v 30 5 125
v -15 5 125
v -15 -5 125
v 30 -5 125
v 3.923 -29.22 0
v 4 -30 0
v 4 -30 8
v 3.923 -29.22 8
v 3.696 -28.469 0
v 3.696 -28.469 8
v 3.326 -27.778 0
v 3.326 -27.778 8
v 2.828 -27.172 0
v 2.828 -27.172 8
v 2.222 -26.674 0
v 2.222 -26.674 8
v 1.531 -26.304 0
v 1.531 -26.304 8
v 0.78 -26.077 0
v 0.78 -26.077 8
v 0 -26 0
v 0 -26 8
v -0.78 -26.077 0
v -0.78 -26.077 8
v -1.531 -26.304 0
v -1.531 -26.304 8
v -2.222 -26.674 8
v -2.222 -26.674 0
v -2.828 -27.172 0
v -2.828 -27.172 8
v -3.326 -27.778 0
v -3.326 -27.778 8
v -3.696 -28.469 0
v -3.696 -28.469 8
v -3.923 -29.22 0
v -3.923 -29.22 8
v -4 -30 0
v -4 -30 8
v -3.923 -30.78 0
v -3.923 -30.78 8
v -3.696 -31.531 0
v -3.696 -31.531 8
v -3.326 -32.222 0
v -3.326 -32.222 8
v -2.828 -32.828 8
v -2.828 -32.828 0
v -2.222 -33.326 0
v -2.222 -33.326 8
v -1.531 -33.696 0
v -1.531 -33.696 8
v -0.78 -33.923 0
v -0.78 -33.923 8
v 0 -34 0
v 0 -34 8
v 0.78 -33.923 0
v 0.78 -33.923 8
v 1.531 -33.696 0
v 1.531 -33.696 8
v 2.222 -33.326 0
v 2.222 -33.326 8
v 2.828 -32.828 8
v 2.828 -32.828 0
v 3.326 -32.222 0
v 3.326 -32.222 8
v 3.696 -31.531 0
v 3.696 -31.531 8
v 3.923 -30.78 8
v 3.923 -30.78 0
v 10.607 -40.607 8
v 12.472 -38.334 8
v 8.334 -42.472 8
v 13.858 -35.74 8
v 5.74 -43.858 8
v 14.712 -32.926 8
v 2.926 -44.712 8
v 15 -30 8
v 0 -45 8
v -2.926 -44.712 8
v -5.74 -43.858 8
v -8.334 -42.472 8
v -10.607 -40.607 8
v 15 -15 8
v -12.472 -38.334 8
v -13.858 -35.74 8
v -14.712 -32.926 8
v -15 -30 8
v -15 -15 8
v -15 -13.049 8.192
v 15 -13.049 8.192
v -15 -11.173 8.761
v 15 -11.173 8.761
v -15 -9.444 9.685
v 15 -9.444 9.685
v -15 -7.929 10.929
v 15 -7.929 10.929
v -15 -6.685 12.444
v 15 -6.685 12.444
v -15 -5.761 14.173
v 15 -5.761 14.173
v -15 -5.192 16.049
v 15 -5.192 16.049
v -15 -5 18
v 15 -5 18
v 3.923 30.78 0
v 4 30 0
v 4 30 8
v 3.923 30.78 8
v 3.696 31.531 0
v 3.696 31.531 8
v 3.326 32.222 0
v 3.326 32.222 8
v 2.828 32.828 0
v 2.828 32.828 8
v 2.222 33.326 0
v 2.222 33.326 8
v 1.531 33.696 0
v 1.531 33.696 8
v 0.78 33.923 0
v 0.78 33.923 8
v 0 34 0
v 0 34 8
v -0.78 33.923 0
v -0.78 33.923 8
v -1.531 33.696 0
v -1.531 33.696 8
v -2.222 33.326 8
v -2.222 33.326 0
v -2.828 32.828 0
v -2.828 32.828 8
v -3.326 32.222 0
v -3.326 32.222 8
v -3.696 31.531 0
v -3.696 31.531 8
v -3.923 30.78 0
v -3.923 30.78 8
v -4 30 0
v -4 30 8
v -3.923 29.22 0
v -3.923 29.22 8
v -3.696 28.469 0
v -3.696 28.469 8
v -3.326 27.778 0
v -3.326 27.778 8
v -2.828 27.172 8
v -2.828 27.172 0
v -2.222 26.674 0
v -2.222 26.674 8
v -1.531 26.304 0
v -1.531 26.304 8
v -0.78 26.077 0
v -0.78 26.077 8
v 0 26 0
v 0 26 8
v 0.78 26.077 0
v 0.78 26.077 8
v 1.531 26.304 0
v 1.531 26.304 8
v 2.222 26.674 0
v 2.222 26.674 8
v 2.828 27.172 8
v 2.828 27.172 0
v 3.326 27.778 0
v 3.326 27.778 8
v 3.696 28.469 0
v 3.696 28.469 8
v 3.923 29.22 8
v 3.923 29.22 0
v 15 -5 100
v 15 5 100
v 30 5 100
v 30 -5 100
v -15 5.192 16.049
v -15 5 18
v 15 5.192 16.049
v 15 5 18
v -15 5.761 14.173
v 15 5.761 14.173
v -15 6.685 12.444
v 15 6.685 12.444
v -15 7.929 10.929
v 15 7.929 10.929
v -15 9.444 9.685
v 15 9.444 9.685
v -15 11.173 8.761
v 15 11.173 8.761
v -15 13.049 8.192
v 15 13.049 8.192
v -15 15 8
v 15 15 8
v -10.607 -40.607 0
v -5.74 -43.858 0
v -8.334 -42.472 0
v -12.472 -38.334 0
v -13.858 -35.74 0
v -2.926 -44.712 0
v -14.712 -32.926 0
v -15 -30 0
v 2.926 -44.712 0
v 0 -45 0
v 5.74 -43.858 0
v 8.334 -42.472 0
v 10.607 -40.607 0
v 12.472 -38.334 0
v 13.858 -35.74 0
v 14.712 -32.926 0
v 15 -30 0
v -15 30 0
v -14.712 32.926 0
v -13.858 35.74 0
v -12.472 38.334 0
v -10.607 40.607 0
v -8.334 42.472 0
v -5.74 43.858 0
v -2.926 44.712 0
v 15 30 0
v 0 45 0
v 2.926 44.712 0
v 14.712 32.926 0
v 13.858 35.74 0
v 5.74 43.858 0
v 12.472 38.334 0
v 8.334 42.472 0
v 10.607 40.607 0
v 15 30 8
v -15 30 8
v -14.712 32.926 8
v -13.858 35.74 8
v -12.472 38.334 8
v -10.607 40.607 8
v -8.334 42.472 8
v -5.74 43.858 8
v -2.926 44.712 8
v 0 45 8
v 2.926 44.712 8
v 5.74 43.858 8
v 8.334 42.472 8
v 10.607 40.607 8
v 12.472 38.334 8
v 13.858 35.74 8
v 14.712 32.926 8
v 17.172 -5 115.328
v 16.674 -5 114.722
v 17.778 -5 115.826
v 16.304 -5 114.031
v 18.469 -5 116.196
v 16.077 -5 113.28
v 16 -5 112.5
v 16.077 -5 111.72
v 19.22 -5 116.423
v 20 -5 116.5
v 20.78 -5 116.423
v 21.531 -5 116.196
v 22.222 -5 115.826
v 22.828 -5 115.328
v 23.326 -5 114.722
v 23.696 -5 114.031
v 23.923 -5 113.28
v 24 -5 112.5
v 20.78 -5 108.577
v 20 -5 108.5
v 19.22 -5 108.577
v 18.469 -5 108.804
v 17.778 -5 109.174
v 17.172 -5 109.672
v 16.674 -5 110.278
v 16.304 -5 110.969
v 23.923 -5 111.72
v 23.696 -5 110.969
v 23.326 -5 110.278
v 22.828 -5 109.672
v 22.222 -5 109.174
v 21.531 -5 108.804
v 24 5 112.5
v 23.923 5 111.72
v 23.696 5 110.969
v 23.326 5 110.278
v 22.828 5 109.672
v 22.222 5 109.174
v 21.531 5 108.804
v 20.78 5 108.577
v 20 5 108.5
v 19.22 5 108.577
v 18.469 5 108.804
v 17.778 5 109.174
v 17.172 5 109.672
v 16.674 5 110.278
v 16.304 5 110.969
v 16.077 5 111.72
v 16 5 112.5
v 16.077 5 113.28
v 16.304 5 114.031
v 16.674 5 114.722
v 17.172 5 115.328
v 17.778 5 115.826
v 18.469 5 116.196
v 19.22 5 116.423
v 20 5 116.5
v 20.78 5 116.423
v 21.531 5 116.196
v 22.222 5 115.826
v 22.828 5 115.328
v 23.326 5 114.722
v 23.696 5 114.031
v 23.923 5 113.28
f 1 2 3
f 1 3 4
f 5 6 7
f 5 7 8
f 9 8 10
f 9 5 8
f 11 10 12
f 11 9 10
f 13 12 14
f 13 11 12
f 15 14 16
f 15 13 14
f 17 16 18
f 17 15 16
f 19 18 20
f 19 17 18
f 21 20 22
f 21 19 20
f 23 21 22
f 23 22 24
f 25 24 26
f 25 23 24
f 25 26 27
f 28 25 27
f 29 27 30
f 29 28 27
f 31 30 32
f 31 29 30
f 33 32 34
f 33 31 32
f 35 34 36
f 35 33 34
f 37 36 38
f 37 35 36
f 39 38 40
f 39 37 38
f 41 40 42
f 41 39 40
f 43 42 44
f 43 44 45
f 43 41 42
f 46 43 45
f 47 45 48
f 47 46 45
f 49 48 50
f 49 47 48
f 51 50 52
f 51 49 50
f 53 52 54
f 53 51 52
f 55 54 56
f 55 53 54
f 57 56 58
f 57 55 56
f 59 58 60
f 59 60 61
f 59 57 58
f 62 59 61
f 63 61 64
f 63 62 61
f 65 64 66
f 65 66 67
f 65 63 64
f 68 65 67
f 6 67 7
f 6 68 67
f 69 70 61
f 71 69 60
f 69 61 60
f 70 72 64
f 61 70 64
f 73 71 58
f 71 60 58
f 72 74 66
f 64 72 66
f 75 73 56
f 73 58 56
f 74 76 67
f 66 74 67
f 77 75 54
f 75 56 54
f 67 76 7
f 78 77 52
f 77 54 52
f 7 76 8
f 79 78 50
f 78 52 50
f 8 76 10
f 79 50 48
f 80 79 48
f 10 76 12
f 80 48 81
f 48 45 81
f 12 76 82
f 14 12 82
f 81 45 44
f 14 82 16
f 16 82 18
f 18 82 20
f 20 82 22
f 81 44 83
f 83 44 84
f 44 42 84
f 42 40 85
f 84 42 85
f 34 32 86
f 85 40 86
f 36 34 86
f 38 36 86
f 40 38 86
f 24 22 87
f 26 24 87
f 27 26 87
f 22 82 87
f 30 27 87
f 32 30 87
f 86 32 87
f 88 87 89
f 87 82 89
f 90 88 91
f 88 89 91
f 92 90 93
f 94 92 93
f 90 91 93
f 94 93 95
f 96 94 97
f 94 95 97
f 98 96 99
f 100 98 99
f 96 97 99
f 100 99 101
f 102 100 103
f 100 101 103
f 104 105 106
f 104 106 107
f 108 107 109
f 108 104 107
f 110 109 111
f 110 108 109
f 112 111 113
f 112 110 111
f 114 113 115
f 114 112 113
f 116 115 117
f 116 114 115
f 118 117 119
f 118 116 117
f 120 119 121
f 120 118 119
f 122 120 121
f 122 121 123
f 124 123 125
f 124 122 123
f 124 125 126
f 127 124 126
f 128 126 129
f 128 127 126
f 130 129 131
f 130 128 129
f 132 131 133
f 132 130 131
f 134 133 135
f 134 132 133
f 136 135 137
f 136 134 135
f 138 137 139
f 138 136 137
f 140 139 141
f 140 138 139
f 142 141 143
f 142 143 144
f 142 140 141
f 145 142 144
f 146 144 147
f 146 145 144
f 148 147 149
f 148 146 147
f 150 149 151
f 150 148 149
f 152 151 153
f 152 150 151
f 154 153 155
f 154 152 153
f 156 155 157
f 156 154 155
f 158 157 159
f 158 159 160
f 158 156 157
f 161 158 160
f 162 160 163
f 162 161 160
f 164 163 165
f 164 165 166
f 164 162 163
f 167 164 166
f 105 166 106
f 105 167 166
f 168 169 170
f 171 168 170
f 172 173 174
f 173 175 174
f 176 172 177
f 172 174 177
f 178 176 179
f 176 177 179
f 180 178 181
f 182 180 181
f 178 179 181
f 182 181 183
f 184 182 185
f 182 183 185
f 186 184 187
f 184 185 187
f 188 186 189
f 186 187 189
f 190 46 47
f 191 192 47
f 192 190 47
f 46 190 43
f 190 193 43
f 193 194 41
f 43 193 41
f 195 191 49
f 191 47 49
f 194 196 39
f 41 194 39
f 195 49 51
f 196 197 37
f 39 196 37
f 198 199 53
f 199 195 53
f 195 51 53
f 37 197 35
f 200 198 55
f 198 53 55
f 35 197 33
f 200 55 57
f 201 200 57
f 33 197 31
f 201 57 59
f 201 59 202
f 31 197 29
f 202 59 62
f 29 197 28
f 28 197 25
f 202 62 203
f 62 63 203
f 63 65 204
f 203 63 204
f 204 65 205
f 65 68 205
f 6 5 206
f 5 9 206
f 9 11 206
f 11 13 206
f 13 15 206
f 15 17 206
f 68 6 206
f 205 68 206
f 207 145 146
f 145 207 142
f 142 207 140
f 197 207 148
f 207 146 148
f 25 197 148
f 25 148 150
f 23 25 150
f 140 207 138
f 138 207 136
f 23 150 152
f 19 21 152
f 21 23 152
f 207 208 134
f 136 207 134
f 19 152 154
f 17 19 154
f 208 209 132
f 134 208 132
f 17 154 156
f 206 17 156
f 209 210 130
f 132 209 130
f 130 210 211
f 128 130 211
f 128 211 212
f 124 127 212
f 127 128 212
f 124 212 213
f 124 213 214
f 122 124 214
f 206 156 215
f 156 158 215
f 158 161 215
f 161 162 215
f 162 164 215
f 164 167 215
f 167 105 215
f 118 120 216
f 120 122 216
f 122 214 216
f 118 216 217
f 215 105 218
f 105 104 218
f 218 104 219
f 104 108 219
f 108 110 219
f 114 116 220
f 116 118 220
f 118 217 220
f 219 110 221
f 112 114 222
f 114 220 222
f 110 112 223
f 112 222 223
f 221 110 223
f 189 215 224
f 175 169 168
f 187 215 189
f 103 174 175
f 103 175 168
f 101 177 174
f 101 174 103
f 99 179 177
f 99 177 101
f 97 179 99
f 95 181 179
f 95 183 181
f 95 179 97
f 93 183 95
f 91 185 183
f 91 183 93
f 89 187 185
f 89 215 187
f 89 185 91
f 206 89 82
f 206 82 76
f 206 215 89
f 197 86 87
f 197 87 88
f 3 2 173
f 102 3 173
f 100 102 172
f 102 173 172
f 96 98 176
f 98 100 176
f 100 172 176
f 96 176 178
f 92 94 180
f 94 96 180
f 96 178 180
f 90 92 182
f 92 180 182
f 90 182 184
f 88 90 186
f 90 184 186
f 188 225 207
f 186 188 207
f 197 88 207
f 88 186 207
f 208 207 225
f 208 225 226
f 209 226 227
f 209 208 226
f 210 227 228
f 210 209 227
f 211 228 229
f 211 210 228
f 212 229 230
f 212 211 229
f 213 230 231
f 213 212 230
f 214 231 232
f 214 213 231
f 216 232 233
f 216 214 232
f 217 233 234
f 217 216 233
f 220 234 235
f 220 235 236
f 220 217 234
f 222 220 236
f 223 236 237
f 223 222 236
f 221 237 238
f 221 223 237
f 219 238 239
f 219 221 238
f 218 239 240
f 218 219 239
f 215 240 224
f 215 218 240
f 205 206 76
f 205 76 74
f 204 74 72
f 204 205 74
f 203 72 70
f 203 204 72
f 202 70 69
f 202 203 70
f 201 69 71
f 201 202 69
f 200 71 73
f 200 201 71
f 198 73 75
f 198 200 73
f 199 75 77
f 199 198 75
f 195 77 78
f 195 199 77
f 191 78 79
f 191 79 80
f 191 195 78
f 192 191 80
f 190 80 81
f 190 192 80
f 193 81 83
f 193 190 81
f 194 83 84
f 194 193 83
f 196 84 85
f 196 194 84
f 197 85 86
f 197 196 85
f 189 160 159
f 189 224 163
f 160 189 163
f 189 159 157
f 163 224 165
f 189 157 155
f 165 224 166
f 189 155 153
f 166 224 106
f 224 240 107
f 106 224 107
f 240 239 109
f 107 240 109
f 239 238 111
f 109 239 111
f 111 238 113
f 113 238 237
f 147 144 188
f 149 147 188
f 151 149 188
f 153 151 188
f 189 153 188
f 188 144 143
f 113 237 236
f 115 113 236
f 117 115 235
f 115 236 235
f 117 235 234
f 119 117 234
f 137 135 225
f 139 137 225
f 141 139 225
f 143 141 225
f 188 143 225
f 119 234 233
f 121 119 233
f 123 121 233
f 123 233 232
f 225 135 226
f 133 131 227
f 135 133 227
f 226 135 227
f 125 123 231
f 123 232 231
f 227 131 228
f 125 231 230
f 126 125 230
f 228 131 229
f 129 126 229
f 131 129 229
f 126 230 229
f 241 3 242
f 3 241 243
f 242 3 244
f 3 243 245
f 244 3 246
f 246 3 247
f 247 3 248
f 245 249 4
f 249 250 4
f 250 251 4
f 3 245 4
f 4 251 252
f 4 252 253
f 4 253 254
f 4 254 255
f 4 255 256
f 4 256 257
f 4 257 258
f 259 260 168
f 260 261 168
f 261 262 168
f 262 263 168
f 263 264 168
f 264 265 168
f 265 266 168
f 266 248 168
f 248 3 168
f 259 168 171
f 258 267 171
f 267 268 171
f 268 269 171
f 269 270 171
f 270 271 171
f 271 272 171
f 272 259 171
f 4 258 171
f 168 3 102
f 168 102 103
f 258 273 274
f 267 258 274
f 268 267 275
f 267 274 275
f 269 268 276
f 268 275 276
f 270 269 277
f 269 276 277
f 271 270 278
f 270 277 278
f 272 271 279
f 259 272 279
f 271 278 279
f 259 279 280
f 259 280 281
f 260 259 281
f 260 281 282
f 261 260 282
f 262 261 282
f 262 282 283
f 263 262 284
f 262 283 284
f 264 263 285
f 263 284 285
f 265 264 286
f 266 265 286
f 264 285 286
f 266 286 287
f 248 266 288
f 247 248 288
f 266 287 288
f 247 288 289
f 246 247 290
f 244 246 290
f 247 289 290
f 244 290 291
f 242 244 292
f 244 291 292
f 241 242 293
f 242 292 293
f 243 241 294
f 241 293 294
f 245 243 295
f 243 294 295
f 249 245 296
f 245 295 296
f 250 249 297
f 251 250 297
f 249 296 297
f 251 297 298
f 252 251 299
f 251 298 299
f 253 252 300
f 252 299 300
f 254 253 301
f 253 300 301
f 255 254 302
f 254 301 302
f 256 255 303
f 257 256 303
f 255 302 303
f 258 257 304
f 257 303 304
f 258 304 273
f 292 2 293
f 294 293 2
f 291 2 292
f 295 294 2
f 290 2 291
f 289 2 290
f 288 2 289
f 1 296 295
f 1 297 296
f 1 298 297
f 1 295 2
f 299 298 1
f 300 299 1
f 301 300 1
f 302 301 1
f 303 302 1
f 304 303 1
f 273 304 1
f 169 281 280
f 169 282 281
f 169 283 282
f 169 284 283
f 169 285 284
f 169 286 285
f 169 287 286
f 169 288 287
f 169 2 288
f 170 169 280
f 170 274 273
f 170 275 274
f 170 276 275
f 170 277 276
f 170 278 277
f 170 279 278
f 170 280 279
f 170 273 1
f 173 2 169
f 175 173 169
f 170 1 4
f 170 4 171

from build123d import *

# Parameters (mm, degrees)
SKETCH1_R           = 4
BOSS_EXTRUDE1_DEPTH = 8
SKETCH2_W           = 30
SKETCH2_H           = 10
BOSS_EXTRUDE2_DEPTH = 100
FILLET1_R           = 10
SKETCH5_W           = 45
SKETCH5_H           = 25
SKETCH5_R           = 4
BOSS_EXTRUDE4_DEPTH = 10


with BuildPart() as part:
    # Sketch1 → Boss-Extrude1 (new body)
    with BuildSketch(Plane.XY):
        with BuildLine():
            Line((15, 30), (15, -30))
            ThreePointArc((15, -30), (0, -45), (-15, -30))
            Line((-15, -30), (-15, 30))
            ThreePointArc((-15, 30), (0, 45), (15, 30))
        make_face()
        with Locations((0, 30)):
            Circle(SKETCH1_R, mode=Mode.SUBTRACT)
        with Locations((0, -30)):
            Circle(SKETCH1_R, mode=Mode.SUBTRACT)
    extrude(amount=BOSS_EXTRUDE1_DEPTH)

    # Sketch2 → Boss-Extrude2 (add)
    with BuildSketch(Plane.XY):
        Rectangle(SKETCH2_W, SKETCH2_H)
    extrude(amount=BOSS_EXTRUDE2_DEPTH)

    # Fillet1
    fillet1_edges = [part.edges().sort_by_distance(p)[0] for p in [
        (0, 5, 8),
        (0, -5, 8),
    ]]
    fillet(fillet1_edges, radius=FILLET1_R)

    # Sketch5 → Boss-Extrude4 (add)
    with BuildSketch(Plane(origin=(0, 5, 0), x_dir=(1, 0, 0), z_dir=(0, 1, 0))):
        with Locations((7.5, -112.5)):
            Rectangle(SKETCH5_W, SKETCH5_H)
        with Locations((20, -112.5)):
            Circle(SKETCH5_R, mode=Mode.SUBTRACT)
    extrude(amount=-BOSS_EXTRUDE4_DEPTH)


solid = part.part
